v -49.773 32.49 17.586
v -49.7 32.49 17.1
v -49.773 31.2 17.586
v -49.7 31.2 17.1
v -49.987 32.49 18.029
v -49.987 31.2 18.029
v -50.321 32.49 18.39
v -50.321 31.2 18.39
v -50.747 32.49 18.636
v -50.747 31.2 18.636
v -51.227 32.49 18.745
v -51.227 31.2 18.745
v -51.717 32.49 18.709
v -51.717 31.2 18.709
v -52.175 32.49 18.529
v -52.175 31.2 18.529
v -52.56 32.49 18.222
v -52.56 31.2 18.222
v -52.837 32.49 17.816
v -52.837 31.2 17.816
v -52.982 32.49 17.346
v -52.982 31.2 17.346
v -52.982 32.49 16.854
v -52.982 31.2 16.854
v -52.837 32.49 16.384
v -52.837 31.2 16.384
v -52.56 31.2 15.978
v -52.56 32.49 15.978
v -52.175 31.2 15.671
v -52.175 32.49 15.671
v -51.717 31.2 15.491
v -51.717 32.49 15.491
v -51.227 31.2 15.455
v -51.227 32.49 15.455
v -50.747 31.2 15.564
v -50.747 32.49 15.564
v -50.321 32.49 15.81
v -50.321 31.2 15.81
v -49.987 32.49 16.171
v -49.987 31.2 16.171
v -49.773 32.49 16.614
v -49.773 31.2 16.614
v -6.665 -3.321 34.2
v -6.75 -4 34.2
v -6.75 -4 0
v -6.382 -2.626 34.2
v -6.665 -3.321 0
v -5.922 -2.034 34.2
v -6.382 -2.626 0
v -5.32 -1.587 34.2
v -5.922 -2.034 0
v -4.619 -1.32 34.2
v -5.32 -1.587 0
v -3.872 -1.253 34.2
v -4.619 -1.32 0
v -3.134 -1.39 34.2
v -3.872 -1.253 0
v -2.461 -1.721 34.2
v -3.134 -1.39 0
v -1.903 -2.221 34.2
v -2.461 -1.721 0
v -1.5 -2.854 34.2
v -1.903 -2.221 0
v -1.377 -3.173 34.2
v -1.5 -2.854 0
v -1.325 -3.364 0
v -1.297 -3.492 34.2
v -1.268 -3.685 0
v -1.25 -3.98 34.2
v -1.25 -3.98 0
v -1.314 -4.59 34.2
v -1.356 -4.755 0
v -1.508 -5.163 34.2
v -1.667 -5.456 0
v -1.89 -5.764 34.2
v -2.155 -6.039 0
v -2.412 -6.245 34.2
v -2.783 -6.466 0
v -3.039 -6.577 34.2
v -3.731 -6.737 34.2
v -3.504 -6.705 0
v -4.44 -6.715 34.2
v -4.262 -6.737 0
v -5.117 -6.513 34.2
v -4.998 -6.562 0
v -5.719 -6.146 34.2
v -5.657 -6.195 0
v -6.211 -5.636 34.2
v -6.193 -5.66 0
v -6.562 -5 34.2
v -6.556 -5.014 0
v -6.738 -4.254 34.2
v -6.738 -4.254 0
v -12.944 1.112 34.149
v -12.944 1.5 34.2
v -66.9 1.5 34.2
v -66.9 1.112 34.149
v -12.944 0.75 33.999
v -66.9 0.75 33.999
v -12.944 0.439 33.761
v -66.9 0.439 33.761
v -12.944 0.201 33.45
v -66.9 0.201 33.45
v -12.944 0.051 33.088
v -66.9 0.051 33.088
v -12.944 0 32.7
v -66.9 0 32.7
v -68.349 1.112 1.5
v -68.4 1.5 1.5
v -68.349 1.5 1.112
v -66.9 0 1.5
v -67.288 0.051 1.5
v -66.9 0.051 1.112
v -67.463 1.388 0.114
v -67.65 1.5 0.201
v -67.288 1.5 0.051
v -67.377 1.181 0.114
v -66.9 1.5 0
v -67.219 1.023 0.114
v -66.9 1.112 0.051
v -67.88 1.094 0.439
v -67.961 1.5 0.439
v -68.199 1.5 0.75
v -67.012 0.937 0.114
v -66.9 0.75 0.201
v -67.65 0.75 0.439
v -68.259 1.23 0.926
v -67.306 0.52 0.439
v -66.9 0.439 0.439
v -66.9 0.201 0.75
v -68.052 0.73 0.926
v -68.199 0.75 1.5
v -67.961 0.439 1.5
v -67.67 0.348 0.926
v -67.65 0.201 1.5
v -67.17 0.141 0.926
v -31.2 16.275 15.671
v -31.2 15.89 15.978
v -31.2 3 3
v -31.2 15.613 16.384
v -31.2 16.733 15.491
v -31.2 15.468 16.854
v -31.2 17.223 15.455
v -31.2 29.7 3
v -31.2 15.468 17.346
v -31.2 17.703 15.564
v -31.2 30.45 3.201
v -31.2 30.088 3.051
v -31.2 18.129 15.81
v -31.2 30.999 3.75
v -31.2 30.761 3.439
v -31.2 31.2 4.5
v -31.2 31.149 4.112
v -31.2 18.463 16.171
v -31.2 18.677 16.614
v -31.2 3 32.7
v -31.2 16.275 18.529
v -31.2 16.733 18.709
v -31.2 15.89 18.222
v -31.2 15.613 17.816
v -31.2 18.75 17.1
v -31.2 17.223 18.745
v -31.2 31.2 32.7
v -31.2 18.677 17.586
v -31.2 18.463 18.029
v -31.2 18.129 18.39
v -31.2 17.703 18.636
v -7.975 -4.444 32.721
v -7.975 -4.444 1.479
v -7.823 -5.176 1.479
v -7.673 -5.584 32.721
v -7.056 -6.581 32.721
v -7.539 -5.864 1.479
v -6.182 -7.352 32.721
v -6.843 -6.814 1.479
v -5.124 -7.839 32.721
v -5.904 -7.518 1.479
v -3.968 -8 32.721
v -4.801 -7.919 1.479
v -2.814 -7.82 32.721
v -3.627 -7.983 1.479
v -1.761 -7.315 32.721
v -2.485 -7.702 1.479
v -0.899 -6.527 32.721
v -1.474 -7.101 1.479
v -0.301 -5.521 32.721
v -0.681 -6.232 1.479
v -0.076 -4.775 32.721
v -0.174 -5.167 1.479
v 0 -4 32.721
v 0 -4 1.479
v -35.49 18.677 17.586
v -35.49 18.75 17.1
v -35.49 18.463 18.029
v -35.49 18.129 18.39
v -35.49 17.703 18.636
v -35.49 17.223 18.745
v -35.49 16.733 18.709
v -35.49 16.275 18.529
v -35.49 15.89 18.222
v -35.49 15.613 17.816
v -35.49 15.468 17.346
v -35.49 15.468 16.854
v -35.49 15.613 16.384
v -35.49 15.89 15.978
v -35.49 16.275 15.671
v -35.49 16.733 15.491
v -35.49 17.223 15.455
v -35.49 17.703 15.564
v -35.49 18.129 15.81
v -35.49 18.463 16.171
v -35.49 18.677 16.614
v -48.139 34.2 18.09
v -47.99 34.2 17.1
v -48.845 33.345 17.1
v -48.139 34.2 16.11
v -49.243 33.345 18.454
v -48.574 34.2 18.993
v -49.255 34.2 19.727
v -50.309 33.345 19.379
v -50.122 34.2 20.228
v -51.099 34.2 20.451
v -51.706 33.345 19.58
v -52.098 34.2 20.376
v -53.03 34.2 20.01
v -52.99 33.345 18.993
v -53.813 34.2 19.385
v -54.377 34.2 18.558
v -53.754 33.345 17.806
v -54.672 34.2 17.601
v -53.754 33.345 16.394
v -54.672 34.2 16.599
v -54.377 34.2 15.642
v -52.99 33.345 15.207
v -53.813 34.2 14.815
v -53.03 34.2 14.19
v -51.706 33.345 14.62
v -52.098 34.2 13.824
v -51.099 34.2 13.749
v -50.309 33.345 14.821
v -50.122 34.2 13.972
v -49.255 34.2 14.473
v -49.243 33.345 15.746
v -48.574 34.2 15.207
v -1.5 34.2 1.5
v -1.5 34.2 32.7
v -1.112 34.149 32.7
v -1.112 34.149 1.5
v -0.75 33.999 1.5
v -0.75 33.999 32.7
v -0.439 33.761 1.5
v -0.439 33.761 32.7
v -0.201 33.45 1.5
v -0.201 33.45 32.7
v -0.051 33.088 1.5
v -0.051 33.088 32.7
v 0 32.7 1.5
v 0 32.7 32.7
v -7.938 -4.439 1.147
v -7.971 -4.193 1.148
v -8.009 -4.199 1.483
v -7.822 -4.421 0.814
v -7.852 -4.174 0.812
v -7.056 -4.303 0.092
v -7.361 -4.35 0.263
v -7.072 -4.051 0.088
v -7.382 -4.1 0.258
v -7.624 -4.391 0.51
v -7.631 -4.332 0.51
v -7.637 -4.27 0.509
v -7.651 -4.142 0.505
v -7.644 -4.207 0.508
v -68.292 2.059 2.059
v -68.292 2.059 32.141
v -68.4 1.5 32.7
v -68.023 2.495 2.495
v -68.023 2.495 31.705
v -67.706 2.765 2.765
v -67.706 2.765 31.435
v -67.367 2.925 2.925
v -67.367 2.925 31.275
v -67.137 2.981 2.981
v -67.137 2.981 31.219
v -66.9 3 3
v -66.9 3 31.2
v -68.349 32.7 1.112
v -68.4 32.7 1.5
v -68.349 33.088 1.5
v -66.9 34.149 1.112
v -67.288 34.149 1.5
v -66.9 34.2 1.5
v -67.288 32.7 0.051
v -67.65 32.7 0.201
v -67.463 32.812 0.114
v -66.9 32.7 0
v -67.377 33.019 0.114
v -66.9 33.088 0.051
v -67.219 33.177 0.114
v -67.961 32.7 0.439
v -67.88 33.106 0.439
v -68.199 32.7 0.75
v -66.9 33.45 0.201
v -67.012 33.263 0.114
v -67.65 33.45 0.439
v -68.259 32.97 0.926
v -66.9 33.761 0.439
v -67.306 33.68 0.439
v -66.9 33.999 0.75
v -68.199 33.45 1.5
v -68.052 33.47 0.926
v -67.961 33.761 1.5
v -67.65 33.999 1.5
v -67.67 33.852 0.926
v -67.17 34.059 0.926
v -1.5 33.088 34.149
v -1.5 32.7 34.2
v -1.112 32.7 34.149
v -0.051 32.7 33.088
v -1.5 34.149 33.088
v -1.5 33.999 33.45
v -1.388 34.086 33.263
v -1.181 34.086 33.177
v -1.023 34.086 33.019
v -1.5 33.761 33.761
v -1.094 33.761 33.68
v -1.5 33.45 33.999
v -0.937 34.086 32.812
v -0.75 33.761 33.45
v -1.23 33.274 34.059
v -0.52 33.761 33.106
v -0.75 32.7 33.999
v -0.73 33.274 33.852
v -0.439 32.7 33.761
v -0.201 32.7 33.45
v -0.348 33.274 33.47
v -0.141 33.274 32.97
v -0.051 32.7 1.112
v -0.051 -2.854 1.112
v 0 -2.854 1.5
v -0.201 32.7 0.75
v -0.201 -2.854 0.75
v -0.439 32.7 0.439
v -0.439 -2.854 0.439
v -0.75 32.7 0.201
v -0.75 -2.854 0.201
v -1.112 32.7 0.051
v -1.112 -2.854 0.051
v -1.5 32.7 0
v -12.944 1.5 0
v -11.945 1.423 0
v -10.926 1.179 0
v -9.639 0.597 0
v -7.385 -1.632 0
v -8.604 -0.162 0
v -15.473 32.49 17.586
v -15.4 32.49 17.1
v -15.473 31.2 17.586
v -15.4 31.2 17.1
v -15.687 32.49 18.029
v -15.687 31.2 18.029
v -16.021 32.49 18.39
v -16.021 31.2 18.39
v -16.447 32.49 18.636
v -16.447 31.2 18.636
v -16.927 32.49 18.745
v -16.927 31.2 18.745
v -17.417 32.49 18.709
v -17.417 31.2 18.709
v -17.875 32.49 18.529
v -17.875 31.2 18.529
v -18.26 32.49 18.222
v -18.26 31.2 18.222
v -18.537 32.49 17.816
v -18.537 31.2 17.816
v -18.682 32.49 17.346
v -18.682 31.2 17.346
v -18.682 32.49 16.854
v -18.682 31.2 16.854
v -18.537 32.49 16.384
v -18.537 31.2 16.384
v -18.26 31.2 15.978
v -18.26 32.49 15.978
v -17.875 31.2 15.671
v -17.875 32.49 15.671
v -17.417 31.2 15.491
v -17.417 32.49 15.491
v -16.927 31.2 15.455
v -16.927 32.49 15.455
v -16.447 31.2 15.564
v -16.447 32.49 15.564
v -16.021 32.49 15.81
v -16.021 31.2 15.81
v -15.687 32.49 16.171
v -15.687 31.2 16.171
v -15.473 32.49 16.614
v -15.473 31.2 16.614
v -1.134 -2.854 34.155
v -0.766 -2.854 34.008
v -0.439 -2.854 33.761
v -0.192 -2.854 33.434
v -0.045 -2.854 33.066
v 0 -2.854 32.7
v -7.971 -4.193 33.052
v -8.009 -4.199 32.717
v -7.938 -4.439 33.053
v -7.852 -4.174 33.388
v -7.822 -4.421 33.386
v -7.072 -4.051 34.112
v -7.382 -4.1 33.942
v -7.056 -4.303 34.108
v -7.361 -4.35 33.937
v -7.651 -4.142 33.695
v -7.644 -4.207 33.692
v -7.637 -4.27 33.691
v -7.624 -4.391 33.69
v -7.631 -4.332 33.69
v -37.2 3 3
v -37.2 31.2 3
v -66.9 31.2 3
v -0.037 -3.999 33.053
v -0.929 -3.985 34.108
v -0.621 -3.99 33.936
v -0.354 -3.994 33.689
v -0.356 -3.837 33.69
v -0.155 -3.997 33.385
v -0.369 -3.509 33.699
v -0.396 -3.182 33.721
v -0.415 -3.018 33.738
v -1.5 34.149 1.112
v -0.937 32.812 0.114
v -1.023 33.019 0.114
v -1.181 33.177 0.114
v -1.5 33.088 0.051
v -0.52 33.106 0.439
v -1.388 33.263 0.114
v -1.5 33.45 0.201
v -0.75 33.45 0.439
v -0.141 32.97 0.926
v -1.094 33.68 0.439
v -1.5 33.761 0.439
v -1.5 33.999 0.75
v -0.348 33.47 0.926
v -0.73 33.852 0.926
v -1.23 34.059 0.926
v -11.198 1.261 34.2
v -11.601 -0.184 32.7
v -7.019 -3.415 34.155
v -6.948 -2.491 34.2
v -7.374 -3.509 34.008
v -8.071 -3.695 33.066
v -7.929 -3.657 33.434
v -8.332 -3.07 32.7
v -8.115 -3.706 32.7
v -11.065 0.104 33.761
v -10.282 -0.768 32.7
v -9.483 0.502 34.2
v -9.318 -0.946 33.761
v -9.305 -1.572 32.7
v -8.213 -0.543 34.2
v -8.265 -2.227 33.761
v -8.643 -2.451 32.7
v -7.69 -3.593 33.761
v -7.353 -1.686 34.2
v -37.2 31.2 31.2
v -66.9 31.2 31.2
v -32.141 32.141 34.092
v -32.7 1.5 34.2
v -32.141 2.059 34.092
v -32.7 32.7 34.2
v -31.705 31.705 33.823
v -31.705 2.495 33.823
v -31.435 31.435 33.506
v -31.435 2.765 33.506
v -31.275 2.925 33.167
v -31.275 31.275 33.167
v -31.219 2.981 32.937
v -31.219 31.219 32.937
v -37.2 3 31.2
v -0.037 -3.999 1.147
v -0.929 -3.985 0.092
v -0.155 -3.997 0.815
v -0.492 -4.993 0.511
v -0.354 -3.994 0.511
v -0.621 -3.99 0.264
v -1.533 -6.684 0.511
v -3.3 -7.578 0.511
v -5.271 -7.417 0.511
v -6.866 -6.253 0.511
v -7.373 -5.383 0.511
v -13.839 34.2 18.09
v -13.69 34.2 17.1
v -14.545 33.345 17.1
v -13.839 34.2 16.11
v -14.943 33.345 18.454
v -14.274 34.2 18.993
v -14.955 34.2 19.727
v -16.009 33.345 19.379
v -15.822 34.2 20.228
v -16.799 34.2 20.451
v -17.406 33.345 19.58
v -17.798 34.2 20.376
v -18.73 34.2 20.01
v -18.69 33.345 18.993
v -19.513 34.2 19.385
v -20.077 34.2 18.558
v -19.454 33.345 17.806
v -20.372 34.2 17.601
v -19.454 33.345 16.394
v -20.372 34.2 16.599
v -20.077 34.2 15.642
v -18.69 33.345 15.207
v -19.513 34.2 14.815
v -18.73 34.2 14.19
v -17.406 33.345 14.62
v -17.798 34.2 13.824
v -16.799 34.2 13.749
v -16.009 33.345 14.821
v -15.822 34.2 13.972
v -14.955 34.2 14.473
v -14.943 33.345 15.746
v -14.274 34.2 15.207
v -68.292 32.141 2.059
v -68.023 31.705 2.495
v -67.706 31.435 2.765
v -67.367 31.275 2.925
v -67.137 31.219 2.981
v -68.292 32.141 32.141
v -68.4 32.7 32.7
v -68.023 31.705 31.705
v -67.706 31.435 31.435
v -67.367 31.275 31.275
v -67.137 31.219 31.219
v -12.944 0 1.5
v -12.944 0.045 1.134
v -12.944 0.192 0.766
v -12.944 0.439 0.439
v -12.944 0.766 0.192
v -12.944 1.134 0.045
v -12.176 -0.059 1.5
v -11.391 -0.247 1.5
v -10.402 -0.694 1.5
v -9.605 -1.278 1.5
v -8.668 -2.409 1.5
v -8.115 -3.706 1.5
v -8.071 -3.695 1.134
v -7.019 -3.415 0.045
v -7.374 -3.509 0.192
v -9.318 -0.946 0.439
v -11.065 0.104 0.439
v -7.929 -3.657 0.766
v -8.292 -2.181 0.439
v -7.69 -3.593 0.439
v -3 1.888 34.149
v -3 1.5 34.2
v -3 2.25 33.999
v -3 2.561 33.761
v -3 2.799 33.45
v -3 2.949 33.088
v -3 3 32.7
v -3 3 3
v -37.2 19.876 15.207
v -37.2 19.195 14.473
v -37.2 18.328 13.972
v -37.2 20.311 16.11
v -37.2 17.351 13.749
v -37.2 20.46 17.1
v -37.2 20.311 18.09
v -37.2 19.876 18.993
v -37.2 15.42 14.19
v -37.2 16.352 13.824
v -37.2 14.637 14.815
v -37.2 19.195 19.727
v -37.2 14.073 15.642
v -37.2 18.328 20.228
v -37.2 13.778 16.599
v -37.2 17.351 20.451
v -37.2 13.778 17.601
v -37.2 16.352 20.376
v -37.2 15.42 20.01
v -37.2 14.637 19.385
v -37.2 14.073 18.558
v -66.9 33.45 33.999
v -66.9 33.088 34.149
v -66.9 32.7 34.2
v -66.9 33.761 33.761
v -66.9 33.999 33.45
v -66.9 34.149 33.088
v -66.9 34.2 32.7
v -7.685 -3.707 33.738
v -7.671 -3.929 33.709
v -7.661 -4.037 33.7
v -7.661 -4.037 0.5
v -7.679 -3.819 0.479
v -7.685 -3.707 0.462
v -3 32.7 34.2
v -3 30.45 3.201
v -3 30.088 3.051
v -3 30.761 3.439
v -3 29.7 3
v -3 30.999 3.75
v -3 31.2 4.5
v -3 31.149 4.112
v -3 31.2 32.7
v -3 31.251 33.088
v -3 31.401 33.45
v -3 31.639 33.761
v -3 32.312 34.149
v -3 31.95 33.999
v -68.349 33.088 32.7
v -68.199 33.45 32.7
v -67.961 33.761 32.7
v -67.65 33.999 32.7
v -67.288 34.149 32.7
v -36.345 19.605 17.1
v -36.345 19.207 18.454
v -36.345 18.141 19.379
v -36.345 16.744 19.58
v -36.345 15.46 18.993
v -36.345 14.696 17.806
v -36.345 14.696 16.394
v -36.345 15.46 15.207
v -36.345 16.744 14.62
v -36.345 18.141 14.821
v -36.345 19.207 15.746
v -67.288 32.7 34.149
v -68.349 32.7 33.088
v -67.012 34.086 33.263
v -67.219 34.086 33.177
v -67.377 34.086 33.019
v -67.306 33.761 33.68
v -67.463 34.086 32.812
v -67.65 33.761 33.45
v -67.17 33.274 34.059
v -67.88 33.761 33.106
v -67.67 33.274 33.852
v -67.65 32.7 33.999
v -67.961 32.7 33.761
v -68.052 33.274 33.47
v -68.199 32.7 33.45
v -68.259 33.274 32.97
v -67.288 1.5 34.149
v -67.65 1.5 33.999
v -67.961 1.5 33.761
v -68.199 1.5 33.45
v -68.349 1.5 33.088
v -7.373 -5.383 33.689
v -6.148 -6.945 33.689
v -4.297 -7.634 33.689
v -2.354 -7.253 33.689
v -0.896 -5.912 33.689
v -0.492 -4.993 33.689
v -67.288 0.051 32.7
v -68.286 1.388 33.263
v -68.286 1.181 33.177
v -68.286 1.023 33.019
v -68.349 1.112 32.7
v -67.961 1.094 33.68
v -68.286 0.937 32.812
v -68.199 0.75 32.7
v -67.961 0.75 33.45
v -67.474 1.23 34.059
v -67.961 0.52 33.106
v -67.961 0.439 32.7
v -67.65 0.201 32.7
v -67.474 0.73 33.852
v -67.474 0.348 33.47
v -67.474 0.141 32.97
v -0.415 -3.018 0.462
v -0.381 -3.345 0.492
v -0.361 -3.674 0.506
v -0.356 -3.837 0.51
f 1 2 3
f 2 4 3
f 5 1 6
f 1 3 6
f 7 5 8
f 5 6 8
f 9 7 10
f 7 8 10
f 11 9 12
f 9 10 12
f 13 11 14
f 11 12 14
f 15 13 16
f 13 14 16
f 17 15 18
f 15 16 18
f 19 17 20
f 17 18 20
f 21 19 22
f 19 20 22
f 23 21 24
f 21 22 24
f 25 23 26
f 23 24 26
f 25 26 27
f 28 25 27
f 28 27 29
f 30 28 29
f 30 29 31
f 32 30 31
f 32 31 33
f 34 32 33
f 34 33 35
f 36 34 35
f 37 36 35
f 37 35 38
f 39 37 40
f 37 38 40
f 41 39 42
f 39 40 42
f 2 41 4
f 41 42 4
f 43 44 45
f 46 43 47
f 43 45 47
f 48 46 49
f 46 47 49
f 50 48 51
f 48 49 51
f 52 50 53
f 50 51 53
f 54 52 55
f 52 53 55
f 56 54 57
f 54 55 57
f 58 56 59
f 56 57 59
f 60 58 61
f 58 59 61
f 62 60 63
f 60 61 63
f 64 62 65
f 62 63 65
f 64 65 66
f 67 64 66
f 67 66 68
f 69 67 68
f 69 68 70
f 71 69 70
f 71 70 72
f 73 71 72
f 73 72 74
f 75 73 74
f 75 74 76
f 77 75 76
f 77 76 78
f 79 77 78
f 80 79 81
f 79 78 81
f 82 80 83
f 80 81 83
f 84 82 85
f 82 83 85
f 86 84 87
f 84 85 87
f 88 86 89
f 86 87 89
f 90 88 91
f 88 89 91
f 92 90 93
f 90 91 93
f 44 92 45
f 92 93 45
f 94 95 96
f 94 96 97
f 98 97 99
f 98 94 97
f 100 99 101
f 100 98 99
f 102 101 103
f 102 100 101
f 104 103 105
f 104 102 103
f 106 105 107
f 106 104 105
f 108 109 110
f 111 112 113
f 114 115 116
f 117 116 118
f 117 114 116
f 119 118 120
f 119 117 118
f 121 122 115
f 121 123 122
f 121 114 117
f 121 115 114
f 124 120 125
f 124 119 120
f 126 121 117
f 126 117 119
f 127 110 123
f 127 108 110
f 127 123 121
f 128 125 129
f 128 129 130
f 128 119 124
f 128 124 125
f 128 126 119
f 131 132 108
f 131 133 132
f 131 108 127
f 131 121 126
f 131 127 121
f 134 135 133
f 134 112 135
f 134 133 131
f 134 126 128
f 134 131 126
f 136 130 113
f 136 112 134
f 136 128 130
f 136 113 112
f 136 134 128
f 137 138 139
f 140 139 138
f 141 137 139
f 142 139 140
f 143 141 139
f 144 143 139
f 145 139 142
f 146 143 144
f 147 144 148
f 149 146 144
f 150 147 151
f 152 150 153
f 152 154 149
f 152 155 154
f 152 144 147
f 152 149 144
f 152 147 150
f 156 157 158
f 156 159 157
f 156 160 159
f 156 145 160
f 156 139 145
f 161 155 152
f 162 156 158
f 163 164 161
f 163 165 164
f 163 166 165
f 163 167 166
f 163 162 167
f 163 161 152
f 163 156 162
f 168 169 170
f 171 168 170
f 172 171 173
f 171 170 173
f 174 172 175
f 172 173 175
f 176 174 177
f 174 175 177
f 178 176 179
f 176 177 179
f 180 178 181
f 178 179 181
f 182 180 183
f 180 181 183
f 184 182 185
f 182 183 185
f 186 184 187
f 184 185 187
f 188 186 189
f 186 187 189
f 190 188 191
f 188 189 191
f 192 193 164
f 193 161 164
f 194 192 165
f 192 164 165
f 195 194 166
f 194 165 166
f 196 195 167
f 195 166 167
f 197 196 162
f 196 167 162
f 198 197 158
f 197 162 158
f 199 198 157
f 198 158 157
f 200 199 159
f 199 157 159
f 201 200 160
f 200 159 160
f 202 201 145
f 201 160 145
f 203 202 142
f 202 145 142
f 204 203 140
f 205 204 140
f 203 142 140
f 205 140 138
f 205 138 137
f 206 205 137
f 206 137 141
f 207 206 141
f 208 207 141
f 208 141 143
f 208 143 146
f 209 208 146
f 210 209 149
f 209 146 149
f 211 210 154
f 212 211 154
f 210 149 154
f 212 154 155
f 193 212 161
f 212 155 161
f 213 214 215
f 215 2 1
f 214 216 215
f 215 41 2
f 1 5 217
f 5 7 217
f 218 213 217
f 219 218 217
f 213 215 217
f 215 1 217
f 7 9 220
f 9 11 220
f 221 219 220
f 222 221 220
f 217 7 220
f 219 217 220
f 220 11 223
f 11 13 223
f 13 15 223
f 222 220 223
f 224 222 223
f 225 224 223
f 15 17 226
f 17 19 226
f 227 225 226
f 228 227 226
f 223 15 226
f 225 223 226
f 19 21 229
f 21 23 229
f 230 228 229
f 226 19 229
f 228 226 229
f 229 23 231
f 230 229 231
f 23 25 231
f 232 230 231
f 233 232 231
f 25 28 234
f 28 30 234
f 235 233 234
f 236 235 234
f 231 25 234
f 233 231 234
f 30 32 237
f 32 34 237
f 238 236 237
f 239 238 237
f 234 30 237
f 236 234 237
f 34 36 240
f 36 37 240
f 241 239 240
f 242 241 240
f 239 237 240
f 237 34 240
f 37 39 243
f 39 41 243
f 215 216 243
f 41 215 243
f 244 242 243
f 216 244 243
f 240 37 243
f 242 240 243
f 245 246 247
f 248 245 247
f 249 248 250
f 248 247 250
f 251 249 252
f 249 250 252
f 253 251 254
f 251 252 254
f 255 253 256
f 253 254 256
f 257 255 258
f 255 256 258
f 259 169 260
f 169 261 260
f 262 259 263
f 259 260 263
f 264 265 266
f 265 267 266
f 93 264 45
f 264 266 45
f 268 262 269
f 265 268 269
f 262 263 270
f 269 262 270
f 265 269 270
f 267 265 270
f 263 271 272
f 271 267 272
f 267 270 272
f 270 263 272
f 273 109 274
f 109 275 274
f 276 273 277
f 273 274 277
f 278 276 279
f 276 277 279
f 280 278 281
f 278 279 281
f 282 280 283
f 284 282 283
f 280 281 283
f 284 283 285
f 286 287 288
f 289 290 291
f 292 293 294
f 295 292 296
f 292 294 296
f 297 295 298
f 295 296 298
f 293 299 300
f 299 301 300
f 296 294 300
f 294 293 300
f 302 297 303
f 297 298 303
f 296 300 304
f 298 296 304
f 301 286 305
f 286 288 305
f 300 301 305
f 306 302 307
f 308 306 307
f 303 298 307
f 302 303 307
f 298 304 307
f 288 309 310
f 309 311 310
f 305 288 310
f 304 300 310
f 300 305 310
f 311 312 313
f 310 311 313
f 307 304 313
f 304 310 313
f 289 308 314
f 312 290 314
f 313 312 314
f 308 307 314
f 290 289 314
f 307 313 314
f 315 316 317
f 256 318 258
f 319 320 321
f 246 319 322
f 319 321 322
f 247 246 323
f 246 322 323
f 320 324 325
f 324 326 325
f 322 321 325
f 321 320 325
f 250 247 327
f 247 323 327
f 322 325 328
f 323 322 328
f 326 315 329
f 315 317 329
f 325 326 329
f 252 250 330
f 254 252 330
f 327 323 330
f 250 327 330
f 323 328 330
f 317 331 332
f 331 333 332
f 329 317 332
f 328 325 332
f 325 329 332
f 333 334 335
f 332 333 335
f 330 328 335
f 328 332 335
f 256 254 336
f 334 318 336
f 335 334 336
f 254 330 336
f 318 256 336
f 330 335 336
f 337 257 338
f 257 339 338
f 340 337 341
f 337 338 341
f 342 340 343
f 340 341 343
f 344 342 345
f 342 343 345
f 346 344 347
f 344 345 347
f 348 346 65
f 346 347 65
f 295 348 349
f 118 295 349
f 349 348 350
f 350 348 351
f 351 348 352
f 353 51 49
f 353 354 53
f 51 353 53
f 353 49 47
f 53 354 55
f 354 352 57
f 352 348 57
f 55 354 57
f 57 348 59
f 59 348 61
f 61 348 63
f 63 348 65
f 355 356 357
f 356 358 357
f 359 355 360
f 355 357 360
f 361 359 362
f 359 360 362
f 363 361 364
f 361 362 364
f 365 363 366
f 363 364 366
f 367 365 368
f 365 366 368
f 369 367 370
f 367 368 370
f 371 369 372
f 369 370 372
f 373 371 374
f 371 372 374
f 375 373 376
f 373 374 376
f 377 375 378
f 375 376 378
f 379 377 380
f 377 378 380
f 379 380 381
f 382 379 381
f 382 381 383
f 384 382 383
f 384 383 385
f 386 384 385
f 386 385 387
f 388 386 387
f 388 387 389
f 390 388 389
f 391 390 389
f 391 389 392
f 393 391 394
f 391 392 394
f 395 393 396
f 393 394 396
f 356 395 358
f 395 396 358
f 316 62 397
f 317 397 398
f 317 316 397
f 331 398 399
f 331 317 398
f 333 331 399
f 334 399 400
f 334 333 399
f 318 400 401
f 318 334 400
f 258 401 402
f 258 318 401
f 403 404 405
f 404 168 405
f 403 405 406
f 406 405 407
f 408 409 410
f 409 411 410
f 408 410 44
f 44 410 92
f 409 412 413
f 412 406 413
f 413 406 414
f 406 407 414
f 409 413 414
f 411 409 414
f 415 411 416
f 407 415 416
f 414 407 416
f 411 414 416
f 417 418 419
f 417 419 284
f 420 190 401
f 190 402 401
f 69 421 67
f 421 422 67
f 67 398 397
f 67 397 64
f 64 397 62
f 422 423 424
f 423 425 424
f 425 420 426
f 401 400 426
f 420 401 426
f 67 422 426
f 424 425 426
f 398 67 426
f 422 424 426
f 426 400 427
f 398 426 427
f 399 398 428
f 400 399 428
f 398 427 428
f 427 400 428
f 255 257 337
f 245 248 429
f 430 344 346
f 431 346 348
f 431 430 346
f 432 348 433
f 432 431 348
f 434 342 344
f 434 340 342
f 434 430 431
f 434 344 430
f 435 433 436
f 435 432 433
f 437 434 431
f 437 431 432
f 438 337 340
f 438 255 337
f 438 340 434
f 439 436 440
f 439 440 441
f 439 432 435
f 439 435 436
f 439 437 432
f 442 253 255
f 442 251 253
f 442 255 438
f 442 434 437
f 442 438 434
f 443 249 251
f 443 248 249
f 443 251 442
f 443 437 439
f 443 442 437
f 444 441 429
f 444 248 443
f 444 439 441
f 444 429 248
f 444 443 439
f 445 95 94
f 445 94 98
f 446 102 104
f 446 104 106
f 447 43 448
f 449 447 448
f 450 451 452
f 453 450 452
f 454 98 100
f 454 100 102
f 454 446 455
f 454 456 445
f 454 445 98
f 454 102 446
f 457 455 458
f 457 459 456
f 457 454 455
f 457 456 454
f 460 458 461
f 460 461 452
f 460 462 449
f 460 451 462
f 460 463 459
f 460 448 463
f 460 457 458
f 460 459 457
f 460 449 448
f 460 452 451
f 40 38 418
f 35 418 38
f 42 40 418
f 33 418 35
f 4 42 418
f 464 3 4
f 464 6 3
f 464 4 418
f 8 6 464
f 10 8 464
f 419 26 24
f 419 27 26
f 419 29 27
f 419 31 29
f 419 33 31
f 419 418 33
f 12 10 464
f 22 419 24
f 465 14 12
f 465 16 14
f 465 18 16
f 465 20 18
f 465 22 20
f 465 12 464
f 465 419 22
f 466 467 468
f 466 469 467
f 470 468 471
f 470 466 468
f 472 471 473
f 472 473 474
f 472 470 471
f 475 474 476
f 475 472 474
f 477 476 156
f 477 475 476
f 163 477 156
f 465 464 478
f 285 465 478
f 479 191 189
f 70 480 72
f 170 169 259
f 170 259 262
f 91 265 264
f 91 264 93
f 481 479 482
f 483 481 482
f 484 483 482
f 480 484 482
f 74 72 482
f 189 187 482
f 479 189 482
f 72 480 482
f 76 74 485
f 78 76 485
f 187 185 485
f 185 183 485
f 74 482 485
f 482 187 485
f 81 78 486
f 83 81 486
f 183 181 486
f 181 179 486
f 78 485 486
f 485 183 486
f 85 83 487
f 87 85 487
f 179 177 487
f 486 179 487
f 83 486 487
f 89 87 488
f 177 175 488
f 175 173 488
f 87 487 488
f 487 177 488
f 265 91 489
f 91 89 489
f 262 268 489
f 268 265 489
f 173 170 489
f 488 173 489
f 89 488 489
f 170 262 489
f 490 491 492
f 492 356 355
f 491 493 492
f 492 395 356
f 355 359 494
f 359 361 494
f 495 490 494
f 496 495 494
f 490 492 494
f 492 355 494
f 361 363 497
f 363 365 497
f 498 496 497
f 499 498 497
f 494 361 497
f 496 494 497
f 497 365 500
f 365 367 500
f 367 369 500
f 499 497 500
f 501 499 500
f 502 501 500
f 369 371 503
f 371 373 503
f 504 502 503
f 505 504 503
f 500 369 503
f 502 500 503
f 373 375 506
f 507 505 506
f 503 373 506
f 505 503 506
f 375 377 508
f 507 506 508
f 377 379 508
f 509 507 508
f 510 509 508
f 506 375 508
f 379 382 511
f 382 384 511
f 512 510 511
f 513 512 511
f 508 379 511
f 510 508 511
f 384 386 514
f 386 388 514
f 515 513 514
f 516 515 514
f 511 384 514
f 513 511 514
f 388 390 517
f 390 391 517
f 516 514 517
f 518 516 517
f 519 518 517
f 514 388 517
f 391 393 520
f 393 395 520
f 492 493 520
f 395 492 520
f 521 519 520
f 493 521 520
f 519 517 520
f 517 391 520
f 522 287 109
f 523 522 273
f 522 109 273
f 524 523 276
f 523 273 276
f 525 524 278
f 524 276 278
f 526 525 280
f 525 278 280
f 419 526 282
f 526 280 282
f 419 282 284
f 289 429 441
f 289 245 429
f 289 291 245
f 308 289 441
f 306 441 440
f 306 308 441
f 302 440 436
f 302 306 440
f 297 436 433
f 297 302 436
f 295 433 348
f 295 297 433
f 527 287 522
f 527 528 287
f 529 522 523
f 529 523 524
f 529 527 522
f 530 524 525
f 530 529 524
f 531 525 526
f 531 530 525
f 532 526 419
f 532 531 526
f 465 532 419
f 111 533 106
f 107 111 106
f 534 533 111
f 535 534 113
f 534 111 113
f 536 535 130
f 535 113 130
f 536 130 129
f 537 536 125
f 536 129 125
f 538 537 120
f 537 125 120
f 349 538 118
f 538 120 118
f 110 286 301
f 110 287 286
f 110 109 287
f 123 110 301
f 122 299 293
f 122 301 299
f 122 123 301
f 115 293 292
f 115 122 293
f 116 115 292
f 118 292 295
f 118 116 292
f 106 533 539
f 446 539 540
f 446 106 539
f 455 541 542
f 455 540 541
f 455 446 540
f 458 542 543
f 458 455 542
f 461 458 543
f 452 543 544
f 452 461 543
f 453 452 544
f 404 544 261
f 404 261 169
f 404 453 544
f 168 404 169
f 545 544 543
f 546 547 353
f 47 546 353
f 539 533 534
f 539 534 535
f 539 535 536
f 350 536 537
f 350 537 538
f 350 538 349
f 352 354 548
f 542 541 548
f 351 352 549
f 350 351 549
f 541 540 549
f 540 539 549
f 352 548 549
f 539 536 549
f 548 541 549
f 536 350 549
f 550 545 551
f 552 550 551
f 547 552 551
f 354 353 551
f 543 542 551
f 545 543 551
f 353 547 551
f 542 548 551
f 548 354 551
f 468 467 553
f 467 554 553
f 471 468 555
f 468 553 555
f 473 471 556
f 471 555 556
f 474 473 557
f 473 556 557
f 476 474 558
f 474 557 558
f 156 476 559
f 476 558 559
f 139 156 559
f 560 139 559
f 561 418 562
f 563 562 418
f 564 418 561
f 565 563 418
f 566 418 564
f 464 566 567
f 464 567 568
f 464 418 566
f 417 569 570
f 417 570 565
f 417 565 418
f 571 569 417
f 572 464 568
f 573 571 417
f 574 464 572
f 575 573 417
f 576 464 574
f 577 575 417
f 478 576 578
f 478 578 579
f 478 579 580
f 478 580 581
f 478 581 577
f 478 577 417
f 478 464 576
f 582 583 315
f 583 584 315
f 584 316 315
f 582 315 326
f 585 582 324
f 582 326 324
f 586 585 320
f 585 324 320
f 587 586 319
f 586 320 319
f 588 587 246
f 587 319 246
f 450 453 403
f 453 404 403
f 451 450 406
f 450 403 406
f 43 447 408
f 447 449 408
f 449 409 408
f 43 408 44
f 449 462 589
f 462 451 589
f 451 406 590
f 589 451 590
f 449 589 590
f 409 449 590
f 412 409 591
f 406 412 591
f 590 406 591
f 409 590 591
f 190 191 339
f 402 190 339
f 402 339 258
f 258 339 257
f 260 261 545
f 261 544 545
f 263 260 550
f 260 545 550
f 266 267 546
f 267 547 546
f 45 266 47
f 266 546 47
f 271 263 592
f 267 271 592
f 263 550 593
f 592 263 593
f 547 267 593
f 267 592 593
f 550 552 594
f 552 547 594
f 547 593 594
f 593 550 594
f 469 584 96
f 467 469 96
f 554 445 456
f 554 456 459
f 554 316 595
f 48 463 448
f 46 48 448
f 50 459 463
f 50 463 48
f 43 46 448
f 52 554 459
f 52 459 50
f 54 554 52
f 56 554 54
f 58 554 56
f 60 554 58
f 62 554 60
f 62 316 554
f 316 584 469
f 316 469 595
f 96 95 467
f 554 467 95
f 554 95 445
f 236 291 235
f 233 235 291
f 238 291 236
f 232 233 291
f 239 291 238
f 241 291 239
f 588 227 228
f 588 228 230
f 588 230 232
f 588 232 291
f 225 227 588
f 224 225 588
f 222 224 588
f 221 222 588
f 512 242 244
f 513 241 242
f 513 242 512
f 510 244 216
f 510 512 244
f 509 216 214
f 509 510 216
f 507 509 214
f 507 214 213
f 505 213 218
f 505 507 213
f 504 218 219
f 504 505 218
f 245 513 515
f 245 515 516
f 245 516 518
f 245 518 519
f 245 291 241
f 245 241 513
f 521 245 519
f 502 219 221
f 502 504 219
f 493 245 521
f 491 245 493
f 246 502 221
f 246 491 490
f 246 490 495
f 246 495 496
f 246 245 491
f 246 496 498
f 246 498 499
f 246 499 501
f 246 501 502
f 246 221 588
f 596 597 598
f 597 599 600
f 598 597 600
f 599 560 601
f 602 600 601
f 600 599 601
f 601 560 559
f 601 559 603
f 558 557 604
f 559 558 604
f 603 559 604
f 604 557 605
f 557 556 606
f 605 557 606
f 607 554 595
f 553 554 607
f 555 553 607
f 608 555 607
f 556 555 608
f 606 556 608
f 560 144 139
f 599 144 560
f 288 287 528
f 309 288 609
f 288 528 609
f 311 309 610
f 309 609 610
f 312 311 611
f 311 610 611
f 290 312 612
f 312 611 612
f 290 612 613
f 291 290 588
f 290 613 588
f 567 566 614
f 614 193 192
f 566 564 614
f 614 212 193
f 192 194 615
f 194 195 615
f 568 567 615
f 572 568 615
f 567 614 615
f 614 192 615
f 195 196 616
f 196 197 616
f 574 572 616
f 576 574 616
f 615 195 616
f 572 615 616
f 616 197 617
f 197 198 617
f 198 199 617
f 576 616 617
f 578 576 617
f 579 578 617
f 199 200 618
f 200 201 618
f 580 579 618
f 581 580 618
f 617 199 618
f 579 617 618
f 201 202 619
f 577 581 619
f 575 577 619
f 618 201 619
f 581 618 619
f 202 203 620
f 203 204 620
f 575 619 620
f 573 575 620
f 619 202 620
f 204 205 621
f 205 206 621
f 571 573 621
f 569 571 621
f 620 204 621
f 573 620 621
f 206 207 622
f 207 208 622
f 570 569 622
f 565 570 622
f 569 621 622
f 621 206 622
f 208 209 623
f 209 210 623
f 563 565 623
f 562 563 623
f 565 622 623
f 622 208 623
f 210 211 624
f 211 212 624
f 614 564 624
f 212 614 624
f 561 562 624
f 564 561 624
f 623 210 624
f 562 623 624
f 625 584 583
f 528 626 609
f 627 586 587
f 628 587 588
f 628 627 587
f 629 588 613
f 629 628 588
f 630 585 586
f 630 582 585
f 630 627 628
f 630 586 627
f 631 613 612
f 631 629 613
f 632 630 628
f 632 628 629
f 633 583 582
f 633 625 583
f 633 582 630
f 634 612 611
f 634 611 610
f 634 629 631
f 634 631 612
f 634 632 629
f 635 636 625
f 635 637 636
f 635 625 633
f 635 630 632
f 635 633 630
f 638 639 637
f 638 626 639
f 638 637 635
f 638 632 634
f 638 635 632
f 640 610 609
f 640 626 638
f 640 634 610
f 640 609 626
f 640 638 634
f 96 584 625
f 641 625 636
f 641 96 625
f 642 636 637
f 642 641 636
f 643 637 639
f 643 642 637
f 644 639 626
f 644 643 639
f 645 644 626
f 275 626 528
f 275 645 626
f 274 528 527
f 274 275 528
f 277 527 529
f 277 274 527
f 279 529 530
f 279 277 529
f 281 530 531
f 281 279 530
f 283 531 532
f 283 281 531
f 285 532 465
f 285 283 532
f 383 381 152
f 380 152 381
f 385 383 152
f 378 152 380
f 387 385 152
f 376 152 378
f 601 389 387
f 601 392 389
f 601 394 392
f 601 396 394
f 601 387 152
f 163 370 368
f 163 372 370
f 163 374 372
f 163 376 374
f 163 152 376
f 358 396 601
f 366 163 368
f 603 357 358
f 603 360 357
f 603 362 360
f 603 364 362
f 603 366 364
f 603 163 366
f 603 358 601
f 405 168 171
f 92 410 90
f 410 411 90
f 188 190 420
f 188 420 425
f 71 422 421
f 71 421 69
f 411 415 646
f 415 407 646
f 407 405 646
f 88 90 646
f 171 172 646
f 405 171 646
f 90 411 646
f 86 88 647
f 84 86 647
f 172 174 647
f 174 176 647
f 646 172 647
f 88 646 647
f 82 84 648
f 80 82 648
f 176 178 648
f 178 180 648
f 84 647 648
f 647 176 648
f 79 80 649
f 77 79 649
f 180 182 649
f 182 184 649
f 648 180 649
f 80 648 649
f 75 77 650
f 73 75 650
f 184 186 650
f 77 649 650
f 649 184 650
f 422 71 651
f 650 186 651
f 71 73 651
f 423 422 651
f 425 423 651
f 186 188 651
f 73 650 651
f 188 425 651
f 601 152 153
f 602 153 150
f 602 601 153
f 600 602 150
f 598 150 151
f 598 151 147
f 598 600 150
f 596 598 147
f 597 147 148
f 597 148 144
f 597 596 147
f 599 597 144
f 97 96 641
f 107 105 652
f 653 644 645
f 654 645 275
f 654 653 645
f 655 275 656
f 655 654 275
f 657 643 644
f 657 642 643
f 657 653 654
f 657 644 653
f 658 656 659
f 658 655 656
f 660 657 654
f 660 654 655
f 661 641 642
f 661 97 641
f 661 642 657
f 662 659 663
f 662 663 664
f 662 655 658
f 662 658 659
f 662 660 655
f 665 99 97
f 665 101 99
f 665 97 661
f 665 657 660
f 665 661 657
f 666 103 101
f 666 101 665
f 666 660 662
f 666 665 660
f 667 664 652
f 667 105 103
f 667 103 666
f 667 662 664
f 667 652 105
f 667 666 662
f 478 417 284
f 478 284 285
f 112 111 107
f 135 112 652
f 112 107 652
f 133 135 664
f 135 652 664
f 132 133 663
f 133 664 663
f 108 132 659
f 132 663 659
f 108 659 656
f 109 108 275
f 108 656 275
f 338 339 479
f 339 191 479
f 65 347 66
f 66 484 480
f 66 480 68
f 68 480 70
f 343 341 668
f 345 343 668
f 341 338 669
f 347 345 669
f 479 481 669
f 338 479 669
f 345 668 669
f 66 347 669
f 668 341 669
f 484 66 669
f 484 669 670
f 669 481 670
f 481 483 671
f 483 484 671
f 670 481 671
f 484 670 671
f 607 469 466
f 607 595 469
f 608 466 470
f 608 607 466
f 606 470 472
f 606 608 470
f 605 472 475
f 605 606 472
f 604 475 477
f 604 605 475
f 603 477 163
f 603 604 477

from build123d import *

# Parameters (mm, degrees)
F1_DEPTH              = 34.2
F2_W                  = 28.2
F2_H                  = 28.2
F3_DEPTH              = 31.2
F4_W                  = 34.2
F4_H                  = 34.2
F5_DEPTH              = 34.2
F6_W                  = 28.2
F6_H                  = 28.2
F7_DEPTH              = 31.2
F10_D                 = 3.3
F10_DEPTH             = 25
F10_CSINK_D           = 6.72
F10_CSINK_ANGLE       = 90
F10_TIP               = 0.9914200214
F10_ON_F9_D           = 3.3
F10_ON_F9_DEPTH       = 25
F10_ON_F9_CSINK_D     = 6.72
F10_ON_F9_CSINK_ANGLE = 90
F10_ON_F9_TIP         = 0.9914200214
F12_D                 = 5.5
F13_R                 = 5
F14_R                 = 1.49999


# Not quite as in the source:
# - a fillet or chamfer is up to 0.001 mm smaller than in the source, because OpenCascade refuses the exact size


with BuildPart() as f1:
    # F0 (on Top) → F1 (new body)
    with BuildSketch(Plane.XY):
        Polygon((-34.2, 0), (-8, 0), (0, 0), (0, 34.2), (-34.2, 34.2), align=None)
        with BuildLine():
            Line((0, 0), (-8, 0))
            Line((-8, 0), (-8, -4))
            ThreePointArc((-8, -4), (-4, -8), (0, -4))
            Line((0, -4), (0, 0))
        make_face()
    extrude(amount=F1_DEPTH)

    # F2 (on face) → F3 (cut)
    with BuildSketch(Plane.XY.offset(34.2)):
        with Locations((-17.1, 17.1)):
            Rectangle(F2_W, F2_H)
    extrude(amount=-F3_DEPTH, mode=Mode.SUBTRACT)

    # F4 (on face) → F5 (join)
    with BuildSketch(Plane(origin=(-34.2, 0, 0), x_dir=(0, -1, 0), z_dir=(-1, 0, 0))):
        with Locations((-17.1, 17.1)):
            Rectangle(F4_W, F4_H)
    extrude(amount=F5_DEPTH)

    # F6 (on face) → F7 (cut)
    with BuildSketch(Plane(origin=(-68.4, 0, 0), x_dir=(0, -1, 0), z_dir=(-1, 0, 0))):
        with Locations((-17.1, 17.1)):
            Rectangle(F6_W, F6_H)
    extrude(amount=-F7_DEPTH, mode=Mode.SUBTRACT)

    # F10
    with Locations(Plane(origin=(0, 34.2, 0), x_dir=(-1, 0, 0), z_dir=(0, 1, 0))):
        with Locations((17.05, 17.1), (51.35, 17.1)):
            CounterSinkHole(F10_D / 2, F10_CSINK_D / 2, depth=F10_DEPTH, counter_sink_angle=F10_CSINK_ANGLE)
            with Locations((0, 0, -(F10_DEPTH + F10_TIP / 2))):  # 118° drill point
                Cone(0, F10_D / 2, F10_TIP, mode=Mode.SUBTRACT)

    # F10 on F9
    with Locations(Plane(origin=(-37.2, 0, 0), x_dir=(0, -1, 0), z_dir=(-1, 0, 0))):
        with Locations((-17.1, 17.1)):
            CounterSinkHole(F10_ON_F9_D / 2, F10_ON_F9_CSINK_D / 2, depth=F10_ON_F9_DEPTH, counter_sink_angle=F10_ON_F9_CSINK_ANGLE)
            with Locations((0, 0, -(F10_ON_F9_DEPTH + F10_ON_F9_TIP / 2))):  # 118° drill point
                Cone(0, F10_ON_F9_D / 2, F10_ON_F9_TIP, mode=Mode.SUBTRACT)

    # F12 (through all)
    with Locations(Plane.XY.offset(34.2)):
        with Locations((-4, -4)):
            Hole(F12_D / 2)

    # F13
    f13_edges = [f1.edges().sort_by_distance(p)[0] for p in [
        (-8, 0, 17.1),
    ]]
    fillet(f13_edges, radius=F13_R)

    # F14 (radius 1.5 in the source; OpenCascade refuses exactly that, so slightly less here)
    f14_edges = [f1.edges().sort_by_distance(p)[0] for p in [
        (-17.1, 3, 34.2),
        (-31.2, 17.1, 34.2),
        (-17.1, 31.2, 34.2),
        (-17.1, 31.2, 3),
        (0, 15.1, 34.2),
        (-40.672136, 0, 34.2),
        (-68.4, 17.1, 34.2),
        (-34.2, 34.2, 34.2),
        (0, 34.2, 17.1),
        (-68.4, 17.1, 31.2),
        (-68.4, 0, 17.1),
        (-68.4, 3, 17.1),
        (-68.4, 31.2, 17.1),
        (-68.4, 34.2, 17.1),
        (-68.4, 17.1, 3),
        (-68.4, 17.1, 0),
        (-40.672136, 0, 0),
        (-34.2, 34.2, 0),
    ]]
    fillet(f14_edges, radius=F14_R)


solid = f1.part
